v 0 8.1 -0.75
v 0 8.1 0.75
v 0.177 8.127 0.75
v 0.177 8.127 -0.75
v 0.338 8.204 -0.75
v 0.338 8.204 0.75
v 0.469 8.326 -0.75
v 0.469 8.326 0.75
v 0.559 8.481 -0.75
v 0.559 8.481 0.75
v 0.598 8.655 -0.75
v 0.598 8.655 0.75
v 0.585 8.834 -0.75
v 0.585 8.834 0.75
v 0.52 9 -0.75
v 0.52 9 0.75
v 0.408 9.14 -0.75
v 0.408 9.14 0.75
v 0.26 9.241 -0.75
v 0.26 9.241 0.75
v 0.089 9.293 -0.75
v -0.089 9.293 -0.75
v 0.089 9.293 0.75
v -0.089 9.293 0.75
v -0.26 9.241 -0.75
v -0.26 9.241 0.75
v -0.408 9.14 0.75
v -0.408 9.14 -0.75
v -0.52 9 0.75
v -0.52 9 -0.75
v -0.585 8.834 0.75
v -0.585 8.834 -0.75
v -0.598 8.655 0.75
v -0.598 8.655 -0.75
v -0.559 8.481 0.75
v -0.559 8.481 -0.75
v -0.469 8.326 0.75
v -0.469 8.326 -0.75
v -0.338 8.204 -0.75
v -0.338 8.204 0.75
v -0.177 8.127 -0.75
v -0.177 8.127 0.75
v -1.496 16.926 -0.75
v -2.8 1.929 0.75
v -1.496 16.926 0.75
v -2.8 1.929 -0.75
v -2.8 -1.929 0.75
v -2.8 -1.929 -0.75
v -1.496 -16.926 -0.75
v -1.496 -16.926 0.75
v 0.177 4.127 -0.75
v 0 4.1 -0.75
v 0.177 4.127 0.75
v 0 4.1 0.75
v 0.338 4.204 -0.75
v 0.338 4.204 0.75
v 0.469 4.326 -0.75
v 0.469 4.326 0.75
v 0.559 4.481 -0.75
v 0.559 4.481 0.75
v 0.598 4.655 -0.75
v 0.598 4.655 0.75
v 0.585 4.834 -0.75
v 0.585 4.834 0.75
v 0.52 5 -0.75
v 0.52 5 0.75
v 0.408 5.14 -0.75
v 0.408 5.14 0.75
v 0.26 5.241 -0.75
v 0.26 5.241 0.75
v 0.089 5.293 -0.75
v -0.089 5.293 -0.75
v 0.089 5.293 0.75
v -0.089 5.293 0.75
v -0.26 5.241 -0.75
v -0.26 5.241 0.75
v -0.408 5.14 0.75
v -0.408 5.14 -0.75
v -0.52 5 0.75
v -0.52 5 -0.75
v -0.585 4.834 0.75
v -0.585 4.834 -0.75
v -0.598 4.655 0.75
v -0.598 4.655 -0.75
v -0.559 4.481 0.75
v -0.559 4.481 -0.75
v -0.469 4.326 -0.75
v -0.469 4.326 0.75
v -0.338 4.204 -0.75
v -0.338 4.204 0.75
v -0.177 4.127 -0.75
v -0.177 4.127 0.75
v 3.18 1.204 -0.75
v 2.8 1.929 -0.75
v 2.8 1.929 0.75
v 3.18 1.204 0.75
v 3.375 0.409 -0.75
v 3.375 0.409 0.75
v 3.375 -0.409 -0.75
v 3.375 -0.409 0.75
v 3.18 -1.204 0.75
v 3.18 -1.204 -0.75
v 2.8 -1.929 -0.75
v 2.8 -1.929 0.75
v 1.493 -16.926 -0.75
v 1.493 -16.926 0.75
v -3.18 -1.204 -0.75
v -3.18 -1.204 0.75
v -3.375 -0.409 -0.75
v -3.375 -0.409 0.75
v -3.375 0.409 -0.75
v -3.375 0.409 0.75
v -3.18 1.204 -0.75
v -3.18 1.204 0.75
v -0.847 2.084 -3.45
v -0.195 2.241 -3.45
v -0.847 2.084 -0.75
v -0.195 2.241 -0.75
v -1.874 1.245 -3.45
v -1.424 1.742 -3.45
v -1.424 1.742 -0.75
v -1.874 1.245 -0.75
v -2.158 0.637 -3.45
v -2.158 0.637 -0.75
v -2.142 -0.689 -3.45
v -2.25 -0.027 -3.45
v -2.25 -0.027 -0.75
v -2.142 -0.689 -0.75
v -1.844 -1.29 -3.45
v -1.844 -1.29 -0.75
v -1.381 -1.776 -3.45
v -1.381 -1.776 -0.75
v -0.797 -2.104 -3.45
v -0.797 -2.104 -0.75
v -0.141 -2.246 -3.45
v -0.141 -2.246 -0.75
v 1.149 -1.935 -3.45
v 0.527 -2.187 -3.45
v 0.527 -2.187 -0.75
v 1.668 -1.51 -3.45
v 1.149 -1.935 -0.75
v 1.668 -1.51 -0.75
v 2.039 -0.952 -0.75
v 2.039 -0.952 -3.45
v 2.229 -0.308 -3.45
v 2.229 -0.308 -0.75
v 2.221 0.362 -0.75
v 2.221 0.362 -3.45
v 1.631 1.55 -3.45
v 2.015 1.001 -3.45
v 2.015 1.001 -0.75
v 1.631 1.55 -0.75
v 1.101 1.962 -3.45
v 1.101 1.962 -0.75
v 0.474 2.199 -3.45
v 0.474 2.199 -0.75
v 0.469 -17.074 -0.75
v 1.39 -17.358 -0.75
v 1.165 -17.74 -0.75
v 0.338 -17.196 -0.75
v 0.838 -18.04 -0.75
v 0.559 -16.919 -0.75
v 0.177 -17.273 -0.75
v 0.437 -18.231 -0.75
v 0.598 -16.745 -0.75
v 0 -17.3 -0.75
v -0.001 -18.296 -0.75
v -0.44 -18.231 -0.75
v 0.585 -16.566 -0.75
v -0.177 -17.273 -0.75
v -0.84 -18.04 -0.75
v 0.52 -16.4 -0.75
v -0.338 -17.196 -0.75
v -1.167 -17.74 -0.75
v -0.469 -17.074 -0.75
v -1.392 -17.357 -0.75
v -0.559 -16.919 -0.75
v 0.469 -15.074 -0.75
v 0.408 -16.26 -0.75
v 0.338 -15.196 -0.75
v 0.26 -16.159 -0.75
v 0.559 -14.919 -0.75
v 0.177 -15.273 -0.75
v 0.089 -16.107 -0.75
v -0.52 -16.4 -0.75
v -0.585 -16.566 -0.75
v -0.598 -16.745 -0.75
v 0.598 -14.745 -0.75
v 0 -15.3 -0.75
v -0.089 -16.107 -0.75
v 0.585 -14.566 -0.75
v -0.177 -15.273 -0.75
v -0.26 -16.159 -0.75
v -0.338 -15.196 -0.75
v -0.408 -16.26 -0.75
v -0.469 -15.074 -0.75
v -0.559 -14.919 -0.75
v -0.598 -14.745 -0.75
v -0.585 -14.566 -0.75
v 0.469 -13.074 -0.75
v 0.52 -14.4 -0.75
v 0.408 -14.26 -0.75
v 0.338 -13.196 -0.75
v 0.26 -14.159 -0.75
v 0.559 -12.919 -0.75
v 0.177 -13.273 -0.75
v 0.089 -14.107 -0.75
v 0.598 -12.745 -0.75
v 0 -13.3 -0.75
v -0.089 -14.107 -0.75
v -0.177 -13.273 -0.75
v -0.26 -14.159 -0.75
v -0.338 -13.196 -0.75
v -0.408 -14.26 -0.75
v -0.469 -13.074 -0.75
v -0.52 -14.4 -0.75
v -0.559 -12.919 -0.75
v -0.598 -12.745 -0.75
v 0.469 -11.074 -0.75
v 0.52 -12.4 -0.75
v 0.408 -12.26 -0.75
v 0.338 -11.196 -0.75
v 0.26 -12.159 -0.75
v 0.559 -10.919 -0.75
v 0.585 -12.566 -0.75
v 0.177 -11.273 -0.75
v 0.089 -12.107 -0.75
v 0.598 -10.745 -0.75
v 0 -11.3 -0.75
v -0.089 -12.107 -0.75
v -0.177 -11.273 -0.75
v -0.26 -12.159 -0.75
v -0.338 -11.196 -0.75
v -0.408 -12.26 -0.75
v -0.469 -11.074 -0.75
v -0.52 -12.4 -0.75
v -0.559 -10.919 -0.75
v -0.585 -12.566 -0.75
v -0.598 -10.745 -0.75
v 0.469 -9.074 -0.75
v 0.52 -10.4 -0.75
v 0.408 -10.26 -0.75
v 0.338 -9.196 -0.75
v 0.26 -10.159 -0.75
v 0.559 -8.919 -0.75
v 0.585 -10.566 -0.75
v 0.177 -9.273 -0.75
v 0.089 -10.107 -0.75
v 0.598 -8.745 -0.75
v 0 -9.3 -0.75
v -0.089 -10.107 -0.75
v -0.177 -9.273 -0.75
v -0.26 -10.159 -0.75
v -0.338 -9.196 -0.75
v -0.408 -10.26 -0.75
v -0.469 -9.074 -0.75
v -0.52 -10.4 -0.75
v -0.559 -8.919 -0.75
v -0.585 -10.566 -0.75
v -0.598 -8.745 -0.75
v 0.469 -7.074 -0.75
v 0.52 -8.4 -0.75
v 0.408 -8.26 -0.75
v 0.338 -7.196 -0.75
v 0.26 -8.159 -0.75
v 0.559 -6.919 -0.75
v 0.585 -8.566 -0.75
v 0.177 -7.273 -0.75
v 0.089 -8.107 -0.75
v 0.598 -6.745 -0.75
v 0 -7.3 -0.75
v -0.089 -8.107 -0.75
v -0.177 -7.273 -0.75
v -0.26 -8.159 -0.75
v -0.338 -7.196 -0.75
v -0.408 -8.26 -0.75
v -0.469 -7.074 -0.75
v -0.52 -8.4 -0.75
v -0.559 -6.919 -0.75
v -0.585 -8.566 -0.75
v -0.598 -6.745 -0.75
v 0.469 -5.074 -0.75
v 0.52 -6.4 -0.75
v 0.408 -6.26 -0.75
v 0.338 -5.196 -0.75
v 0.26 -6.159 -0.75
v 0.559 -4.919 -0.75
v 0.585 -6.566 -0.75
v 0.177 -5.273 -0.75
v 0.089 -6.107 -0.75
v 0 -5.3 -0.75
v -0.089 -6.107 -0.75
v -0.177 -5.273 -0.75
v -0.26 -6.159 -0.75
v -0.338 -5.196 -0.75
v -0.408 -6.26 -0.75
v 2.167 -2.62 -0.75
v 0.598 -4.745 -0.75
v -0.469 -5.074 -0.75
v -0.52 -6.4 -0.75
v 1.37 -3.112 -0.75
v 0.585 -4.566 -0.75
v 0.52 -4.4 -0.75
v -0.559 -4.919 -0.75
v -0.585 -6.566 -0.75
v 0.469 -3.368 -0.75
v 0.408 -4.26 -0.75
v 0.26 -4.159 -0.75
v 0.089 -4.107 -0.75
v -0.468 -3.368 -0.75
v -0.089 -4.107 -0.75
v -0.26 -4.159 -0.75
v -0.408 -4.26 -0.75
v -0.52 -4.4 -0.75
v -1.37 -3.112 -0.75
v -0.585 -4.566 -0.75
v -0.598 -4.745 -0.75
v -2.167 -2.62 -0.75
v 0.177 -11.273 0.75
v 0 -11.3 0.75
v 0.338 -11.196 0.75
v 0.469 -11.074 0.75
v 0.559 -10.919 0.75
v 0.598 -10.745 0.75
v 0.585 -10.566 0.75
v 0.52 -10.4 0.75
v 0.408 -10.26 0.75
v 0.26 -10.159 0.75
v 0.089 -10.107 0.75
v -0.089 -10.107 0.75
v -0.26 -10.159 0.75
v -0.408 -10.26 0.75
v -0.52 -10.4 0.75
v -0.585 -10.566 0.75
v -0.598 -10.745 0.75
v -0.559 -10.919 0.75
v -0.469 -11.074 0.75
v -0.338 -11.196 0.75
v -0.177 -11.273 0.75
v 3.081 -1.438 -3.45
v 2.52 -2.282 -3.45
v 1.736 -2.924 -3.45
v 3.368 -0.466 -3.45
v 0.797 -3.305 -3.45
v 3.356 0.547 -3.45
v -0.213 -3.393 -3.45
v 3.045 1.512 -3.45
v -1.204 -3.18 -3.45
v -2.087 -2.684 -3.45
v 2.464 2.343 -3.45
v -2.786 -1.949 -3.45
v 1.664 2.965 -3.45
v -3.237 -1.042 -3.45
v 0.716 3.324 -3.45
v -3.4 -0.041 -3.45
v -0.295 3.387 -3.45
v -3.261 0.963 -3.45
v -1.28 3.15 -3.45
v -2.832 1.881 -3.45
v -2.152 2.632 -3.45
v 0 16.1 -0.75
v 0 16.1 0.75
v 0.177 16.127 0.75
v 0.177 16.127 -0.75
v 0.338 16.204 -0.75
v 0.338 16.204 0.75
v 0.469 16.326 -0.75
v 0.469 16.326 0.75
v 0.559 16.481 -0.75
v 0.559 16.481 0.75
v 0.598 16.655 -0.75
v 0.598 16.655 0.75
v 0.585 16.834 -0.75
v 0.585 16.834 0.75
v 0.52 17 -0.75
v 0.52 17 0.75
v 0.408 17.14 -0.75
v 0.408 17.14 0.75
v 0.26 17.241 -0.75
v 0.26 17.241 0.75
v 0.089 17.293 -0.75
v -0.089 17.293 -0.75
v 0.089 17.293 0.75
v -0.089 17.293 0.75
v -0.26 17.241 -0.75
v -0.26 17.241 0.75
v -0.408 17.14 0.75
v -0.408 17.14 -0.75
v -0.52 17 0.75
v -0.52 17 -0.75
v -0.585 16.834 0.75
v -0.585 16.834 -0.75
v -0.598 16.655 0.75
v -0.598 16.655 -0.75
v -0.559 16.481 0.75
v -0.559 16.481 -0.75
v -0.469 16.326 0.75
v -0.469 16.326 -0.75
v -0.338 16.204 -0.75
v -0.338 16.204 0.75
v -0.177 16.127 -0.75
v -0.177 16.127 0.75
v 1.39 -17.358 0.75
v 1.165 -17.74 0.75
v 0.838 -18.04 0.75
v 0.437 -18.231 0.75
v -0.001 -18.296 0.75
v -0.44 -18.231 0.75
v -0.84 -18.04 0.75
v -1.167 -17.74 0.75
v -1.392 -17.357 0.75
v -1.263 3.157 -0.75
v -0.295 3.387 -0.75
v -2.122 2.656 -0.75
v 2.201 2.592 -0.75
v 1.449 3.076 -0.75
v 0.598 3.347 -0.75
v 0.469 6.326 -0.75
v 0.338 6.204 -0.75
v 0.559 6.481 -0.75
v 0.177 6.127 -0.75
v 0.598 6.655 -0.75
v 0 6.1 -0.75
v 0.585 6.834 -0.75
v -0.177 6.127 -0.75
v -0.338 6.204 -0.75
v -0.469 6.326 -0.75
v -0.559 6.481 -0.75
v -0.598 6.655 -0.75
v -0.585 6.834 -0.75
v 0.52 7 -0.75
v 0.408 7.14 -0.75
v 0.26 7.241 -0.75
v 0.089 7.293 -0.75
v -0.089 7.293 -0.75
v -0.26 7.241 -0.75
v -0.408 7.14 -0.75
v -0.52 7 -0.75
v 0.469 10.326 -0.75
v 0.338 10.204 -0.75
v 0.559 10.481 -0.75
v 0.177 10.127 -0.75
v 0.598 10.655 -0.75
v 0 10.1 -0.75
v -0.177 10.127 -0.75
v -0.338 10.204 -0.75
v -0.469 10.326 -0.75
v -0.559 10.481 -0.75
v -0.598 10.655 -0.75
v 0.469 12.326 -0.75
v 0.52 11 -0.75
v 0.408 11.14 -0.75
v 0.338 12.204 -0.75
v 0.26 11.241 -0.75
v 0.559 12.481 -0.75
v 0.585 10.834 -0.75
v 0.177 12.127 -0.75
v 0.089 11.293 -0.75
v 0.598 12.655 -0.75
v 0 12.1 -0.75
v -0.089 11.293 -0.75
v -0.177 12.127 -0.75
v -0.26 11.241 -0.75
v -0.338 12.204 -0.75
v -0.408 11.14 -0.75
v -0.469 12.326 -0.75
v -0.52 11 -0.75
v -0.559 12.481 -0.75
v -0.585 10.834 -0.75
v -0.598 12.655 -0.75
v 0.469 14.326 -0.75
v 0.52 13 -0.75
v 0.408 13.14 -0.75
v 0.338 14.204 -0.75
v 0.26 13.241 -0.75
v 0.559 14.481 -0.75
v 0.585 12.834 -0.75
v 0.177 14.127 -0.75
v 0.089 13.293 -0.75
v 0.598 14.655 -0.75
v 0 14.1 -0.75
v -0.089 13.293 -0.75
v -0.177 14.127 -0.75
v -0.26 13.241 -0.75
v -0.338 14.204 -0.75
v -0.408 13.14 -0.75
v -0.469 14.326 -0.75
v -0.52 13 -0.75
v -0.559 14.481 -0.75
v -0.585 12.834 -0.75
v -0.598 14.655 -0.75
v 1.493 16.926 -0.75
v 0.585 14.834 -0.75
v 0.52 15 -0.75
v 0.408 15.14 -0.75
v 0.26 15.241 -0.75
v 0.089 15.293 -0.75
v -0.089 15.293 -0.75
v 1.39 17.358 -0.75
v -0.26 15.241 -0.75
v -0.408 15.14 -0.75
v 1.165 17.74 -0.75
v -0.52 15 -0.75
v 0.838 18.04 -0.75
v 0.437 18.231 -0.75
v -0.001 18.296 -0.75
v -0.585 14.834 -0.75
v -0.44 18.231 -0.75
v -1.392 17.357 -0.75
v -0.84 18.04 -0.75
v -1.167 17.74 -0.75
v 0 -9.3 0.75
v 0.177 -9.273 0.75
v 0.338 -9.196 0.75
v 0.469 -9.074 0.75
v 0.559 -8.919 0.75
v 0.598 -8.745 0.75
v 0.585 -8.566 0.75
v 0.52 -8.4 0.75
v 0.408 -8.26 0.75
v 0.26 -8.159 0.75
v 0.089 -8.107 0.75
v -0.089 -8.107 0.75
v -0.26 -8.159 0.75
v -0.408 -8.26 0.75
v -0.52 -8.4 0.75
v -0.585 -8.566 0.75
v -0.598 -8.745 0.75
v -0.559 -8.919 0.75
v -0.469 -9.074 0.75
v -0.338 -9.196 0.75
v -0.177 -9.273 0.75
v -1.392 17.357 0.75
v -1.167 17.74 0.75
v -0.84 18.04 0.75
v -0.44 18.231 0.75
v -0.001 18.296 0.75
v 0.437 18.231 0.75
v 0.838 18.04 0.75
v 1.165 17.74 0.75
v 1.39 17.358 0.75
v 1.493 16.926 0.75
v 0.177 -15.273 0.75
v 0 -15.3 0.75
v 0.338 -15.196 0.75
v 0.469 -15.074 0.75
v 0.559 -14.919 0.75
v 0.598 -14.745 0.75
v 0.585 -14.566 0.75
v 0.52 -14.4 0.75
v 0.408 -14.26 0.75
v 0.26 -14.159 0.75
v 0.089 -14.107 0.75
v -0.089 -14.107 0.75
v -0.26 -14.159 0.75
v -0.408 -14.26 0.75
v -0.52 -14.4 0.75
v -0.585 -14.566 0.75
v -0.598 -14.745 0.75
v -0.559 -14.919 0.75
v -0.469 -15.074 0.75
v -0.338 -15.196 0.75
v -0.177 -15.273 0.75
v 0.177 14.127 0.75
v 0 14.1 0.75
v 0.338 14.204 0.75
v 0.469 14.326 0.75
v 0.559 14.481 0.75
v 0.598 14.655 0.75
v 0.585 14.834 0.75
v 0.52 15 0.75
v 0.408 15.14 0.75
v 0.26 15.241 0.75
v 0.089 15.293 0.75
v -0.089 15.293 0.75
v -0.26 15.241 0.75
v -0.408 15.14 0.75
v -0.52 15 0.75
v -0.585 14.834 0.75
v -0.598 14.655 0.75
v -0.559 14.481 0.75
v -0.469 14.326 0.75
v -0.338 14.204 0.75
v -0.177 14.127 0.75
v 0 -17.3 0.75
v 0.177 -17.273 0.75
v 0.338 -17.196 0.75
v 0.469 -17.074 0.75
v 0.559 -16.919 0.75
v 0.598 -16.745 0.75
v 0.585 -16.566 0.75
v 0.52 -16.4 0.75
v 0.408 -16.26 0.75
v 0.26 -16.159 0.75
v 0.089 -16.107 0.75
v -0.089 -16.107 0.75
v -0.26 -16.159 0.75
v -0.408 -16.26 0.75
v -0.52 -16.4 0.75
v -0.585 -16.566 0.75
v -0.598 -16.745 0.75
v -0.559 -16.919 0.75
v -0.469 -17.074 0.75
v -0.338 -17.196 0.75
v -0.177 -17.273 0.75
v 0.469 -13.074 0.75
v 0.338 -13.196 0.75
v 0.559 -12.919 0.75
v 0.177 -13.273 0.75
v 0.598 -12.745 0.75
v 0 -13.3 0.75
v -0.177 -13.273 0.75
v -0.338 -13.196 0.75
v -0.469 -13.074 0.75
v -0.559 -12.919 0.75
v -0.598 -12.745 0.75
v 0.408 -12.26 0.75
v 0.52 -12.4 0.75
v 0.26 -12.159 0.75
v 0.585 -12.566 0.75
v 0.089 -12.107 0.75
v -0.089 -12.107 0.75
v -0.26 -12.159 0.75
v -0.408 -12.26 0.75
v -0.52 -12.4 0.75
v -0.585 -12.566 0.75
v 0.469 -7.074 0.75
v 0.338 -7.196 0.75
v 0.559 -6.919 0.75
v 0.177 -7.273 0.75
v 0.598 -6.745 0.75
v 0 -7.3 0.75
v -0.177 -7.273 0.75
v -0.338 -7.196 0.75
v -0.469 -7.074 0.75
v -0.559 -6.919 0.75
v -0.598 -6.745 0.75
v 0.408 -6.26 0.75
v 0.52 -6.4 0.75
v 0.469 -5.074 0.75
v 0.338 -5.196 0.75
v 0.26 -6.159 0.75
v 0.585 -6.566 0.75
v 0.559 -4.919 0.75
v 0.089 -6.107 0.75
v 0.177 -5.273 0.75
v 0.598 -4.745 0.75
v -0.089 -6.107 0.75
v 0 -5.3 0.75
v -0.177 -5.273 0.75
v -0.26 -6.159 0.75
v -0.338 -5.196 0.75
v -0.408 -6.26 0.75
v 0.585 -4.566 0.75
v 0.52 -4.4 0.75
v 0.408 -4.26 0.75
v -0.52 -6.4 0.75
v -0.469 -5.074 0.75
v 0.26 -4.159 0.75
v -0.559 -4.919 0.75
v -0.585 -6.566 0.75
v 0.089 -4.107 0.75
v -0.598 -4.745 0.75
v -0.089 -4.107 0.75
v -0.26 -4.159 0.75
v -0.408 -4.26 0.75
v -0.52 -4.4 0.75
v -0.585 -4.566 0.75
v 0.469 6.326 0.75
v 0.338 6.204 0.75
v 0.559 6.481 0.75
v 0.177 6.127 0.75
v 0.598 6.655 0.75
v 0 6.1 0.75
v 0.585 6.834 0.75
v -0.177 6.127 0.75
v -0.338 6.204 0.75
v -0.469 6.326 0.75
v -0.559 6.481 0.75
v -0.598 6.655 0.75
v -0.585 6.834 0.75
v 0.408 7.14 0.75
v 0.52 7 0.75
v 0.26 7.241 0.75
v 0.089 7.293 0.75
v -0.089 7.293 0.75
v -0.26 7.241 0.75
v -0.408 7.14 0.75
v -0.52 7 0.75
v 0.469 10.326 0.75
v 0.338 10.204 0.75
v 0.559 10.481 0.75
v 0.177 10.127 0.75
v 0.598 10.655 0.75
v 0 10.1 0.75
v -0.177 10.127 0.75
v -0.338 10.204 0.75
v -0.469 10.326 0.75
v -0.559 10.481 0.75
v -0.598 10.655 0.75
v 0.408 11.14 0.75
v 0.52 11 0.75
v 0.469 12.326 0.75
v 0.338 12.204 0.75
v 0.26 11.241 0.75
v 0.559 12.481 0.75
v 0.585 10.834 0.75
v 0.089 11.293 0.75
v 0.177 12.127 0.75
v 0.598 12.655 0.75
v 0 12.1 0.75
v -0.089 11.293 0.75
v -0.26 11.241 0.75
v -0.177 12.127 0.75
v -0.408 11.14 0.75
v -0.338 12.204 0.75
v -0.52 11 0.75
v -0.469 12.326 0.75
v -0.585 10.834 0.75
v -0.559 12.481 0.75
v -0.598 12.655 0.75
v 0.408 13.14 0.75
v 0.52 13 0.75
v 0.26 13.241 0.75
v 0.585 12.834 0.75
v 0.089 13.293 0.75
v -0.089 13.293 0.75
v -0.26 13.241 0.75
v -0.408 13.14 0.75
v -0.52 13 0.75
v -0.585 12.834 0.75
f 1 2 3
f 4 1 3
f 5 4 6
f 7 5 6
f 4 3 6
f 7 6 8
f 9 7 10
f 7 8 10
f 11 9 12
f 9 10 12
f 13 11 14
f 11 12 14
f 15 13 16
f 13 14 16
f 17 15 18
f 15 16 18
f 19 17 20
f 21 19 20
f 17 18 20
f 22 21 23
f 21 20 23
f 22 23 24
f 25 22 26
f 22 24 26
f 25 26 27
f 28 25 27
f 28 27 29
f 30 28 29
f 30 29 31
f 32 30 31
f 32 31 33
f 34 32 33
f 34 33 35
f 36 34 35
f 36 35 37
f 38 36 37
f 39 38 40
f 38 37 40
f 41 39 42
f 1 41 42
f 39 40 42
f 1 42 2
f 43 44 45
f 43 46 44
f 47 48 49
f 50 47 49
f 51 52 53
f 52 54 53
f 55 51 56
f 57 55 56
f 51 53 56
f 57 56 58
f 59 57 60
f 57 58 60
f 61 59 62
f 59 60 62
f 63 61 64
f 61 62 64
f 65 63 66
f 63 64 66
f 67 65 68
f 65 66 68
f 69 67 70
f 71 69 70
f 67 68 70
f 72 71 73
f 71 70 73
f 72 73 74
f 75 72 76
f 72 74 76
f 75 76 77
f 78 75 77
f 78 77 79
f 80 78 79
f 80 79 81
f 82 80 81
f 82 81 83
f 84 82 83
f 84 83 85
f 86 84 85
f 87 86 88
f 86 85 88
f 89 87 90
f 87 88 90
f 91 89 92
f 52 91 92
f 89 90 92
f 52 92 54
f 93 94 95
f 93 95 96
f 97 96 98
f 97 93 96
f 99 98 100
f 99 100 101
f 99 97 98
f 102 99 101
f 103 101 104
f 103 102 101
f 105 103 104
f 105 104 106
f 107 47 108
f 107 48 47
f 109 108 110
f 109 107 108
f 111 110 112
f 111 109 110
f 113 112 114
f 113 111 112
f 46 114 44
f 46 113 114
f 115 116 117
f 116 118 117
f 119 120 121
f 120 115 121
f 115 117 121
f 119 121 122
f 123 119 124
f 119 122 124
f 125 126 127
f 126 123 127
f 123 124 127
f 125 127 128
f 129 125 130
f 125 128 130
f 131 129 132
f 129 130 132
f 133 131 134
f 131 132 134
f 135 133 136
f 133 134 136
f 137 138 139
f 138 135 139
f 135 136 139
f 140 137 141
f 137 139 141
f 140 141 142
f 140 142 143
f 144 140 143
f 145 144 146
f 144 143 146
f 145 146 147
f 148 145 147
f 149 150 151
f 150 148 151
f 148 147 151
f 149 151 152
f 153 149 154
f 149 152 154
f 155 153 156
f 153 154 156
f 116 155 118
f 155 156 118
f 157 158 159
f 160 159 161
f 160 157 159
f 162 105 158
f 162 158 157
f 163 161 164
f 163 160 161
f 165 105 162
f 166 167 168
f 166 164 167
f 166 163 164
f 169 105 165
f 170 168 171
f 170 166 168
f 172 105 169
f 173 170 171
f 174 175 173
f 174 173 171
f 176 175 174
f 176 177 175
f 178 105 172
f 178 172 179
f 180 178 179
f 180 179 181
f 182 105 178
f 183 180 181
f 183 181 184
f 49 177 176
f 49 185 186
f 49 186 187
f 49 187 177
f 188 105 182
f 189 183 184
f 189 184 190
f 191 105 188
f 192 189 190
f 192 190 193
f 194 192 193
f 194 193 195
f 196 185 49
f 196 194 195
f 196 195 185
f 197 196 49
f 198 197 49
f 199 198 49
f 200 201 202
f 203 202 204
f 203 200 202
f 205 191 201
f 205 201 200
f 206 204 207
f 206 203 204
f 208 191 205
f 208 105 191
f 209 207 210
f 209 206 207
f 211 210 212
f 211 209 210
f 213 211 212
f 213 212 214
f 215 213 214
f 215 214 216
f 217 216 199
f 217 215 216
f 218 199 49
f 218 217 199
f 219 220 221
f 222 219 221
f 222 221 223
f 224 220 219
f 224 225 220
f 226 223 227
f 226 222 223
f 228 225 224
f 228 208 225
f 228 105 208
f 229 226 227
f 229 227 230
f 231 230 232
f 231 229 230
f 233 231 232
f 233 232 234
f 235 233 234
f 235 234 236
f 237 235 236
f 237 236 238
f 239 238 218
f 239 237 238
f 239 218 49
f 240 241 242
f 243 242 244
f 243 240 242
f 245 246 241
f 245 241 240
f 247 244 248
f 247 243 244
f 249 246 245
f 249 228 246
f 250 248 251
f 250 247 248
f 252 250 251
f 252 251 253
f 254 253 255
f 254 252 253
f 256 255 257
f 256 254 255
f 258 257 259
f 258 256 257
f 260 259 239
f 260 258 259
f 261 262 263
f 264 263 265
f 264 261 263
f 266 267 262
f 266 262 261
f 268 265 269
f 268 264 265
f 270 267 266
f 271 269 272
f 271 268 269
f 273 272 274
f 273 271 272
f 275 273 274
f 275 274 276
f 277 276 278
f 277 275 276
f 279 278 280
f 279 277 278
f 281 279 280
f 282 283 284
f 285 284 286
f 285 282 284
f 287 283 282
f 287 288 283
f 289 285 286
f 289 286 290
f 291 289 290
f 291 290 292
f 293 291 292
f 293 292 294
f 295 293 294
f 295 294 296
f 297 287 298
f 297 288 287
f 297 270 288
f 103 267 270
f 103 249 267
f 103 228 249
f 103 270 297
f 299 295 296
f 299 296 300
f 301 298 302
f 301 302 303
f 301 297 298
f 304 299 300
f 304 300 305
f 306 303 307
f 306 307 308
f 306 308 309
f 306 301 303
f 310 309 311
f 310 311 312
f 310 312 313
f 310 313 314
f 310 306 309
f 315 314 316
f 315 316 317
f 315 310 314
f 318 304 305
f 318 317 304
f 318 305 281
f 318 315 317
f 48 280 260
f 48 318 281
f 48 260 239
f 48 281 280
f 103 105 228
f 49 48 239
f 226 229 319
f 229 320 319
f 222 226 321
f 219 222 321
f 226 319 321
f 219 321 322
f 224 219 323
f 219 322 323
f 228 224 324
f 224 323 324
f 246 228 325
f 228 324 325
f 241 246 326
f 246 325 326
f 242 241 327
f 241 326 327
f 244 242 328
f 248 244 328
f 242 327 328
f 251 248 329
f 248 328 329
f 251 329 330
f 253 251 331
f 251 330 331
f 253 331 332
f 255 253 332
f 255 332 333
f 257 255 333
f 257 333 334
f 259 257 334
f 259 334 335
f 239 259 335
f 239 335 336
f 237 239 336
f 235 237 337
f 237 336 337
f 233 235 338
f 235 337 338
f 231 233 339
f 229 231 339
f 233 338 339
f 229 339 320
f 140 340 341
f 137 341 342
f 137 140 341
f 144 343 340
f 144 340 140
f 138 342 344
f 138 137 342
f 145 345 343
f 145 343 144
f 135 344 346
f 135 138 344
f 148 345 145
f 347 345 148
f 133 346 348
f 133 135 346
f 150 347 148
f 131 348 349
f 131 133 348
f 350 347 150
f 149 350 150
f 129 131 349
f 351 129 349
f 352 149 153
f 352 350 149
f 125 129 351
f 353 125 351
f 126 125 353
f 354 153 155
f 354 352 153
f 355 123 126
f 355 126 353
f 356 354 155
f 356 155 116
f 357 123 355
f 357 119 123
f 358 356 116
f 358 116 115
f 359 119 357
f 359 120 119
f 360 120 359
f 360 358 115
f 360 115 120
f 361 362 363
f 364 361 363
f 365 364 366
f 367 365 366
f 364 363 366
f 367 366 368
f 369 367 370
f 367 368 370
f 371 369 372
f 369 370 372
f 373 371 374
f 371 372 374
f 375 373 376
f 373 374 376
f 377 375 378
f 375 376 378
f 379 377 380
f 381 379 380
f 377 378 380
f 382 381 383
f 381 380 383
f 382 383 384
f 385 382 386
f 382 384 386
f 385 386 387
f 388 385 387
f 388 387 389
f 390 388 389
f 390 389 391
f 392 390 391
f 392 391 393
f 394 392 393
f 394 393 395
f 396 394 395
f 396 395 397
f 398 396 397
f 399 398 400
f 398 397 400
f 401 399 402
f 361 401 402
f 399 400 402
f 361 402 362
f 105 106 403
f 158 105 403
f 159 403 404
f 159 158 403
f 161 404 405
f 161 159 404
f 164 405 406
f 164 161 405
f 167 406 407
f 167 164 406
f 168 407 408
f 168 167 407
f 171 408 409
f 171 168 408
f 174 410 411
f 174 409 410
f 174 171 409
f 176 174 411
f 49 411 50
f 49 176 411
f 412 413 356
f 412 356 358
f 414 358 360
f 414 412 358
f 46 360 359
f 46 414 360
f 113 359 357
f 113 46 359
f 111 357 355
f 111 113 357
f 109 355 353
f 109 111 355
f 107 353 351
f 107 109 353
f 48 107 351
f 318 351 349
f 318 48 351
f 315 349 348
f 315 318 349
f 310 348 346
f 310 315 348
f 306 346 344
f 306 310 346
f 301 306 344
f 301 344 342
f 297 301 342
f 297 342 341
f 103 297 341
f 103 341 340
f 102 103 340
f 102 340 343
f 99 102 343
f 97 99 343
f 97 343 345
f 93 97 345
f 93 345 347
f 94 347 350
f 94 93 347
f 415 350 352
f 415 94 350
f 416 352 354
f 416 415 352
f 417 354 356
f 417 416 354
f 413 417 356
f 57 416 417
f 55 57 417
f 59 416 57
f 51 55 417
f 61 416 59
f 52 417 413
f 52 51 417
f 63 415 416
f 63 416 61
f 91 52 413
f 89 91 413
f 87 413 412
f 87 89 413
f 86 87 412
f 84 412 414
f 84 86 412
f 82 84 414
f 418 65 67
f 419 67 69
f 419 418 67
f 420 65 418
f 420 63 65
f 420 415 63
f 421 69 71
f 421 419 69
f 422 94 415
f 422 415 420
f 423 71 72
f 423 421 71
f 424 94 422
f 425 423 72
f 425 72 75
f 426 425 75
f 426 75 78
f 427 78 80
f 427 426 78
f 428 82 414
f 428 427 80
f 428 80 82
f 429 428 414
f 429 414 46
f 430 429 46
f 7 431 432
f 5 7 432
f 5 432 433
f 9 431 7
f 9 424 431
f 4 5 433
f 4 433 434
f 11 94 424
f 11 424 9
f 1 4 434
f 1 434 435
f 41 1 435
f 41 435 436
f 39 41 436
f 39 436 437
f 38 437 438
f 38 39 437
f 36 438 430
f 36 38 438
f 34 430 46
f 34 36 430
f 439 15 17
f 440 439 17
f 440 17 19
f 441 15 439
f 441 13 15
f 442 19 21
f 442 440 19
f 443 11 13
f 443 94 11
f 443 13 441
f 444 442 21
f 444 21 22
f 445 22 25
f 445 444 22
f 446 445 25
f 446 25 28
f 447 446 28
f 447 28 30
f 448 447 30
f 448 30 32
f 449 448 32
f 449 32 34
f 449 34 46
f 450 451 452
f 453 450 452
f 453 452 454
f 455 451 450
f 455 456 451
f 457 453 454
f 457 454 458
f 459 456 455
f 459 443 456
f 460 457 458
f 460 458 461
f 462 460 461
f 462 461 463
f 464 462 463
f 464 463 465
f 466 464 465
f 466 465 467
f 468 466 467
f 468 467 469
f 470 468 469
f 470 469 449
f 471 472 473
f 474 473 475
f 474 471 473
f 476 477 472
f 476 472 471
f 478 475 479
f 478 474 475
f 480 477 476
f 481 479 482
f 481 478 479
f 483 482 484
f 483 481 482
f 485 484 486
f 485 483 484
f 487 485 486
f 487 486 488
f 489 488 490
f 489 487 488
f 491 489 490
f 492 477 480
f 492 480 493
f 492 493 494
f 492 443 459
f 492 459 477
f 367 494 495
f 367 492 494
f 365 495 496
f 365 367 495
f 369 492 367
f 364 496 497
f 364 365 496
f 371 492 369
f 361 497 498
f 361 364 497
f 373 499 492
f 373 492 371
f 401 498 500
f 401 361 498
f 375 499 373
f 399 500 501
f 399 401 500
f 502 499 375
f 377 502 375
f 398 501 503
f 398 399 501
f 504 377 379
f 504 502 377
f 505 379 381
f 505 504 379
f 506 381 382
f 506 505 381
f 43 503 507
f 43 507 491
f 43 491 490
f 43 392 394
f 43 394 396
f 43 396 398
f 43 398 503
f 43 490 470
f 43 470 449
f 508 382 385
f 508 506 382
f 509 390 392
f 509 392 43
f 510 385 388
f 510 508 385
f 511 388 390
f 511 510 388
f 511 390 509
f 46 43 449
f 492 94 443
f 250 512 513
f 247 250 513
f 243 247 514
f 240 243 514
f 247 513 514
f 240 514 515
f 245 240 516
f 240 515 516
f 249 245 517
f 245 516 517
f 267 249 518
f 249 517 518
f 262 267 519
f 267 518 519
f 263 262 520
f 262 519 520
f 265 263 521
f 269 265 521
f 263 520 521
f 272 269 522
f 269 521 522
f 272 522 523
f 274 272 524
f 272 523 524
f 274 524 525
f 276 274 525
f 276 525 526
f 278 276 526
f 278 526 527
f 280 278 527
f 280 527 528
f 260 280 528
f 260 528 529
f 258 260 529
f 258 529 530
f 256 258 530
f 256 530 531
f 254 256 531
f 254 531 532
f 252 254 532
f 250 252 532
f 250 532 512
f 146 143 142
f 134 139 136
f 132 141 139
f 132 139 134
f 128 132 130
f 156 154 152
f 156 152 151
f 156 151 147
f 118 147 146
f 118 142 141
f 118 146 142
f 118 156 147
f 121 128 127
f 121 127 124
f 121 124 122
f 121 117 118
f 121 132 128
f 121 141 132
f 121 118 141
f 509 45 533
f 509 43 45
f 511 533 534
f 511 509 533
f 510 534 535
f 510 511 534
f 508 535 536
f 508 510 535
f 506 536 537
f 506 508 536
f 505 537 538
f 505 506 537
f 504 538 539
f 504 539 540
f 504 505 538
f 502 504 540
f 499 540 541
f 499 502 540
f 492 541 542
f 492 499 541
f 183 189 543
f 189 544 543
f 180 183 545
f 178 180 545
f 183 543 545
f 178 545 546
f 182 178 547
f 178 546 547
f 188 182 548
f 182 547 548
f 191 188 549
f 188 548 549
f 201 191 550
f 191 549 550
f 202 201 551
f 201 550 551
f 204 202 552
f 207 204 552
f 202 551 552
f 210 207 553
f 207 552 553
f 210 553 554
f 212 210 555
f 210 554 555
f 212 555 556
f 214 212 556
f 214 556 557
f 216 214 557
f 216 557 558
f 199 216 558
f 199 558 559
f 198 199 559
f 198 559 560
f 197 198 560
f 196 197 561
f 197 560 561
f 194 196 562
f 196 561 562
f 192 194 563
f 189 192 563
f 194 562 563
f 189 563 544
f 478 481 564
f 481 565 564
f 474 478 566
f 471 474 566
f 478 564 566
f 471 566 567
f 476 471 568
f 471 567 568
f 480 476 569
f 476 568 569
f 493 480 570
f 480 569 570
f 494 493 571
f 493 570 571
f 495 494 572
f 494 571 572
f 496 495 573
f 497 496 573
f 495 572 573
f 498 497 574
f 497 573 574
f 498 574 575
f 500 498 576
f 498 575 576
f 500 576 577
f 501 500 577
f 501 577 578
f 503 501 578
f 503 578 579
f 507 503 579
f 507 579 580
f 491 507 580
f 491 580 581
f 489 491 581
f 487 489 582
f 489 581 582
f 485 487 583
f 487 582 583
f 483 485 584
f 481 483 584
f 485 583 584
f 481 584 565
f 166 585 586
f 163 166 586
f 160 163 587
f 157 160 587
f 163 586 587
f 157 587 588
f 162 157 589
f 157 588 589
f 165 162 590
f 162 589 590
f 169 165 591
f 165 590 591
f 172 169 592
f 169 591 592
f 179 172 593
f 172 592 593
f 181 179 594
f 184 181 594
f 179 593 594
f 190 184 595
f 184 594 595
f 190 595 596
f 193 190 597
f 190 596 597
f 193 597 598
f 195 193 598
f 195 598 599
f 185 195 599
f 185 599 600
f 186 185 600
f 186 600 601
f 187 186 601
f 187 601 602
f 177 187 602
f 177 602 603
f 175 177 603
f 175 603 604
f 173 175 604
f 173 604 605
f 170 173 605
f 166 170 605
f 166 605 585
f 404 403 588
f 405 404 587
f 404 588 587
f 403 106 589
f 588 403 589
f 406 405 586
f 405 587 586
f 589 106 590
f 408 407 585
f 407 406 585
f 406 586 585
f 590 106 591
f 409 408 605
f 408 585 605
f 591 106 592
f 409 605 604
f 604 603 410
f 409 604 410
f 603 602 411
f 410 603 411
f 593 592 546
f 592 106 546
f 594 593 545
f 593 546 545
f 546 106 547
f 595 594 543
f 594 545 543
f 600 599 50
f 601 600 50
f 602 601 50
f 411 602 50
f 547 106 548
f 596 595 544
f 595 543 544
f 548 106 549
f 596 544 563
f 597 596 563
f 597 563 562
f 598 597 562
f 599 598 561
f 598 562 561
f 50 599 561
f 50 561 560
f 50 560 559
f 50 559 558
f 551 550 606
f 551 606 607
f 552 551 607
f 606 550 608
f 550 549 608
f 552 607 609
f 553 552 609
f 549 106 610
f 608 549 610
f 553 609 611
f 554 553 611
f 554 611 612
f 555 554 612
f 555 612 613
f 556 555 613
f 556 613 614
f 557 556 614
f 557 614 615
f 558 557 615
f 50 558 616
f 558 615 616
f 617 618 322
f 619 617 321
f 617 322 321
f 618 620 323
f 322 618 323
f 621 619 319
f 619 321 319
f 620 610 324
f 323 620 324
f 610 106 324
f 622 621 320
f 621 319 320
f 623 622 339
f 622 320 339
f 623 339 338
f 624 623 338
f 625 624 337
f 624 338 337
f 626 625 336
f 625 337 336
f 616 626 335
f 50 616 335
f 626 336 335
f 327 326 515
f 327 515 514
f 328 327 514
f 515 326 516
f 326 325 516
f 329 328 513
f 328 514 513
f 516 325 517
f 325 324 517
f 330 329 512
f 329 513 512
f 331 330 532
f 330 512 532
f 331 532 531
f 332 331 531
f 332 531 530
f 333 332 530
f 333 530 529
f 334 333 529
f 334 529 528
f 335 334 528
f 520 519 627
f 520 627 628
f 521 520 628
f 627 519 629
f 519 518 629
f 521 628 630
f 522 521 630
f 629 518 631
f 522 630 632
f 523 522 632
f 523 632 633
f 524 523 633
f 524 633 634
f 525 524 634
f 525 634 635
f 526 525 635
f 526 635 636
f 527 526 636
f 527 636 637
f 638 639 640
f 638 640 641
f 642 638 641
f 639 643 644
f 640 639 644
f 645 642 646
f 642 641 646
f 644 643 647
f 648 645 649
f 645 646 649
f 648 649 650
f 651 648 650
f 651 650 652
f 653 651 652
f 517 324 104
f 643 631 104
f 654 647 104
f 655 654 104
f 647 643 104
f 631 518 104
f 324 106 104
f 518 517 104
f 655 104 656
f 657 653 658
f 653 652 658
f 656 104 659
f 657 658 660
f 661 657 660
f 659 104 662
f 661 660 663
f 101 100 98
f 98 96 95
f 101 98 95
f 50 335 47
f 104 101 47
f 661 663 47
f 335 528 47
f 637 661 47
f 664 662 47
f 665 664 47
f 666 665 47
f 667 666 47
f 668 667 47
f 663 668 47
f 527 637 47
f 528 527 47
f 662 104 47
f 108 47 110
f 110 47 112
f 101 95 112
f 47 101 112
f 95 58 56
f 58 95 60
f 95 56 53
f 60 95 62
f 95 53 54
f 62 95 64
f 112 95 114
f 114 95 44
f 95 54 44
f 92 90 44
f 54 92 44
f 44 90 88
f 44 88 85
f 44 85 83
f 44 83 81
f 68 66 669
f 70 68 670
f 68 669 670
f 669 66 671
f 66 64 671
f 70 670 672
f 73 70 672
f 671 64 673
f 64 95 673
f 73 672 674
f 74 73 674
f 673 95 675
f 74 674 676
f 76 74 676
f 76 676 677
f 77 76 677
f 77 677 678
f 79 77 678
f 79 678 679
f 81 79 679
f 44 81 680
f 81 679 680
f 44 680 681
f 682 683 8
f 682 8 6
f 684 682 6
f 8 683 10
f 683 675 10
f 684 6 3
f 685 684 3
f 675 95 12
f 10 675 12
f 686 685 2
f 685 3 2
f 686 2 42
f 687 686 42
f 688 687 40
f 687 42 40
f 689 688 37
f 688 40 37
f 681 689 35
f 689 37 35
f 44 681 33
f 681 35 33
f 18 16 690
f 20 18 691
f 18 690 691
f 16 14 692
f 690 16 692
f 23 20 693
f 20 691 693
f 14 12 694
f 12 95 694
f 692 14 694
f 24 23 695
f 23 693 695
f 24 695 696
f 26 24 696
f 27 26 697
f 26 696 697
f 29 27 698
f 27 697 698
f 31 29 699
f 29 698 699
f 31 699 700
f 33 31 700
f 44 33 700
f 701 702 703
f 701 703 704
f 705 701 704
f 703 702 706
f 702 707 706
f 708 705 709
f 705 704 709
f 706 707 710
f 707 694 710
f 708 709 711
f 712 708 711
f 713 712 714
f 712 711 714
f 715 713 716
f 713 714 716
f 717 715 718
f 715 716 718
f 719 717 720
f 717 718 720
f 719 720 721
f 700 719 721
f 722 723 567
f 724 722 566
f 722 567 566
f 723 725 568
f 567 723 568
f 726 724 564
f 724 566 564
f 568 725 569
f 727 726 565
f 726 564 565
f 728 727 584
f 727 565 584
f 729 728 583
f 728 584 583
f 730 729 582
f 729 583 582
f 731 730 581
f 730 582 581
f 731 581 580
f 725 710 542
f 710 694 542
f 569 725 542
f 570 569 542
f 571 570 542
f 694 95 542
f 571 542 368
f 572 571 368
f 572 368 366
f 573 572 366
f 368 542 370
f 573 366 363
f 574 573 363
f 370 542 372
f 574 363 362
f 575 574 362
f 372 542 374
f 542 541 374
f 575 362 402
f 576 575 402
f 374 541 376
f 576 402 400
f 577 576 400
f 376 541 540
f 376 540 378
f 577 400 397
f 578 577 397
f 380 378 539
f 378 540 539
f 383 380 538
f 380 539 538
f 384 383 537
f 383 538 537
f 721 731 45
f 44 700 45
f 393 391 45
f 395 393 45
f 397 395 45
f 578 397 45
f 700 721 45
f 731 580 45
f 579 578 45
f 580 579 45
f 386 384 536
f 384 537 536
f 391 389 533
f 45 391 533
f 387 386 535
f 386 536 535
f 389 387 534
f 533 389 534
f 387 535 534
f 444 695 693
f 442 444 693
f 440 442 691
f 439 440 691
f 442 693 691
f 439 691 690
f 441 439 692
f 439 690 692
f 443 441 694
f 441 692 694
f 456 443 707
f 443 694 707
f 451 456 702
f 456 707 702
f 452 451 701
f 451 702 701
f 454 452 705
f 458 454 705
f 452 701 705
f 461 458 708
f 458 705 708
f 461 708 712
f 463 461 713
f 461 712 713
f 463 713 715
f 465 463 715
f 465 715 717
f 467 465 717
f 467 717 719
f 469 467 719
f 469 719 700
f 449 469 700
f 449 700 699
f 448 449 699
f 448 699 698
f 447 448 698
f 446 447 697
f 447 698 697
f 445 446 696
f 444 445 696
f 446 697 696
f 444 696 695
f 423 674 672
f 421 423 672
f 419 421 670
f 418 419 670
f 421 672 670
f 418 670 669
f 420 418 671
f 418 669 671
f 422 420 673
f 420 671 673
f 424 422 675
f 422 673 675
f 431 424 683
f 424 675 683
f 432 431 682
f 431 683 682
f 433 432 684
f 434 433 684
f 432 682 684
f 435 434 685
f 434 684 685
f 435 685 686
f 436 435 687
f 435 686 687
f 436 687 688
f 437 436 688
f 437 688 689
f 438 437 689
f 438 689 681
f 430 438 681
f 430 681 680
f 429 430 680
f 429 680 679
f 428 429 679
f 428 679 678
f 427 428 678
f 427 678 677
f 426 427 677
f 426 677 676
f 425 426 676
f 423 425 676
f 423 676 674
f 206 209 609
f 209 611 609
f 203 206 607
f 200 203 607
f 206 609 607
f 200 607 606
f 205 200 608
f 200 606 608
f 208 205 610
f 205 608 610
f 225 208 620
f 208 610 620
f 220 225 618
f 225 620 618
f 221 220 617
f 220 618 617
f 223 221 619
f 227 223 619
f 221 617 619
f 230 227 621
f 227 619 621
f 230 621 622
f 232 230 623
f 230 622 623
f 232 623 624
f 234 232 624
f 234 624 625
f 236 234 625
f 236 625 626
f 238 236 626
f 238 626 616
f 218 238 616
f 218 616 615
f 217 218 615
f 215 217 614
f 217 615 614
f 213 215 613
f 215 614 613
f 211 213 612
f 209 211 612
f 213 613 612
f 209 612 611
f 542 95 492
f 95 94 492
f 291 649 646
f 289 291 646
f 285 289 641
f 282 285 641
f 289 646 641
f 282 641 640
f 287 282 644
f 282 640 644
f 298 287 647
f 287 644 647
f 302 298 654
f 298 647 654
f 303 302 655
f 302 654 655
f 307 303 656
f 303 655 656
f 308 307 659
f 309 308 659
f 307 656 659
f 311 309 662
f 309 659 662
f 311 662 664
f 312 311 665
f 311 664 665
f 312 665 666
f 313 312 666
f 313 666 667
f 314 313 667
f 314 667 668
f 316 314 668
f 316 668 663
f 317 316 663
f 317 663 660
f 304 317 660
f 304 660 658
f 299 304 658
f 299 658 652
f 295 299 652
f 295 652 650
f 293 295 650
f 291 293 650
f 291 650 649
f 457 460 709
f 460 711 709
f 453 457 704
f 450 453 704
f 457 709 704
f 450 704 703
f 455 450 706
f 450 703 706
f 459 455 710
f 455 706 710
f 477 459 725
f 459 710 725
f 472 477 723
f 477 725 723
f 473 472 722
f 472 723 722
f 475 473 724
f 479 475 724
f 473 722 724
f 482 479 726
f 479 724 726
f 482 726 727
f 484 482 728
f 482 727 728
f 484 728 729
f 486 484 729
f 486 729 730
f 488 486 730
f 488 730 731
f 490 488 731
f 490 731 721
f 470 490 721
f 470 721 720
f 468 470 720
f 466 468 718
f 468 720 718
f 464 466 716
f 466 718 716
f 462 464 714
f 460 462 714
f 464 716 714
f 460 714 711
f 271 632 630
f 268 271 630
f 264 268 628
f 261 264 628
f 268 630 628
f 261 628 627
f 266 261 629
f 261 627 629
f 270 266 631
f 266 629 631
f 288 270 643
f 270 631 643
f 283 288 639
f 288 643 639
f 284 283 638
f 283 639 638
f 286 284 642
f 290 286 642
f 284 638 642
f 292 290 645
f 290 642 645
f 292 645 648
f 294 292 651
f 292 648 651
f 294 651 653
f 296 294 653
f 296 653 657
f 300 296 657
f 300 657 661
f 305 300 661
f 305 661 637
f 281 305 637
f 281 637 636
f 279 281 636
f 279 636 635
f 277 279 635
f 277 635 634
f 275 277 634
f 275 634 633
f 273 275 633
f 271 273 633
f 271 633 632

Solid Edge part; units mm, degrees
sketch "Sketch1" plane through (0, 0, 0) normal (0, 0, 1) x (1, 0, 0)
  line L0 (-2.8, 1.9287) -> (-1.4957, 16.9261)
  line L1 (2.8, 1.9287) -> (1.493, 16.9264)
  arc A0 (2.8, 1.9287) -> (2.8, -1.9287) centre (0, 0) cw
  line L2 (2.8, -1.9287) -> (1.493, -16.9264)
  arc A1 (-1.4957, -16.9261) -> (1.493, -16.9264) centre (-0.0013, -16.7962) ccw
  line L3 (-2.8, -1.9287) -> (-1.4957, -16.9261)
  arc A2 (-2.8, -1.9287) -> (-2.8, 1.9287) centre (0, 0) cw
  arc A3 (-1.4957, 16.9261) -> (1.493, 16.9264) centre (-0.0013, 16.7962) cw
  dimension "D1" = 16.7962
  dimension "D2" = 3.4
  dimension "D3" = 5.6
extrude "Protrusion1" add sketch "Sketch1" along normal mid plane 1.5
hole "Agujero_8" at (0, 14.7, 2) direction (0, 0, -1) diameter 1.2 end up to next
hole "Hole1" at (0, 4.7, 2) direction (0, 0, -1) diameter 1.2 end up to next
hole "Hole2" at (0, 6.7, 2) direction (0, 0, -1) diameter 1.2 end up to next
hole "Hole3" at (0, 8.7, 2) direction (0, 0, -1) diameter 1.2 end up to next
hole "Hole4" at (0, 10.7, 2) direction (0, 0, -1) diameter 1.2 end up to next
hole "Hole5" at (0, 12.7, 2) direction (0, 0, -1) diameter 1.2 end up to next
hole "Hole6" at (0, 16.7, 2) direction (0, 0, -1) diameter 1.2 end up to next
hole "Hole7" at (0, -14.7, 2) direction (0, 0, -1) diameter 1.2 end up to next
hole "Hole8" at (0, -4.7, 2) direction (0, 0, -1) diameter 1.2 end up to next
hole "Hole9" at (0, -6.7, 2) direction (0, 0, -1) diameter 1.2 end up to next
hole "Hole10" at (0, -8.7, 2) direction (0, 0, -1) diameter 1.2 end up to next
hole "Hole11" at (0, -10.7, 2) direction (0, 0, -1) diameter 1.2 end up to next
hole "Hole12" at (0, -12.7, 2) direction (0, 0, -1) diameter 1.2 end up to next
hole "Hole13" at (0, -16.7, 2) direction (0, 0, -1) diameter 1.2 end up to next
sketch "Sketch2" plane through (0, 7.4481, -0.75) normal (0, 0, -1) x (-0.0868172, 0.9962243, 0)
  circle A0 centre (-7.42, -0.6466) radius 2.25
  circle A1 centre (-7.42, -0.6466) radius 3.4
extrude "ProtrusiónExtruida_2" add sketch "Sketch2" along normal blind 2.7
properties material "ABS, medio impacto"
